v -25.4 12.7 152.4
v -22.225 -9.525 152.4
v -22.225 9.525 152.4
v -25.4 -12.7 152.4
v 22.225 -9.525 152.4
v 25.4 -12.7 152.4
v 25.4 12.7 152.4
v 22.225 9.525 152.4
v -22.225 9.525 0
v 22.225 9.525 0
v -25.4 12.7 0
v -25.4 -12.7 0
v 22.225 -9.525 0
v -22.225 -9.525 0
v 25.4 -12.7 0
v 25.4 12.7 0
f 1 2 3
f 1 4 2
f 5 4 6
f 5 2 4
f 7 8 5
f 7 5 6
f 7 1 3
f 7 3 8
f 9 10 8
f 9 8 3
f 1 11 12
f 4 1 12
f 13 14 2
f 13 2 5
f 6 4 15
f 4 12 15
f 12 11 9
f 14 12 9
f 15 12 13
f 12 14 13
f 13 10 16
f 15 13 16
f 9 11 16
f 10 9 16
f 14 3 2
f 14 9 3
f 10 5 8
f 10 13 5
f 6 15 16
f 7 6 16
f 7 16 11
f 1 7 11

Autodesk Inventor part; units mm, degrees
ref_plane "YZ Plane" through (0, 0, 0) normal (1, 0, 0) x (0, 1, 0)
ref_plane "Start Plane" through (0, 0, 0) normal (0, 0, 1) x (1, 0, 0)
ref_plane "End Plane" through (0, 0, 152.4) normal (0, 0, 1) x (1, 0, 0)
sketch "Sketch" plane through (0, 0, 0) normal (0, 0, 1) x (1, 0, 0)
  line L0 (-25.4, -12.7) -> (25.4, -12.7)
  line L1 (25.4, -12.7) -> (25.4, 12.7)
  line L2 (25.4, 12.7) -> (-25.4, 12.7)
  line L3 (-25.4, 12.7) -> (-25.4, -12.7)
  line L4 (-25.4, -12.7) -> (25.4, 12.7) construction
  line L5 (25.4, -12.7) -> (-25.4, 12.7) construction
  line L6 (-22.225, -9.525) -> (22.225, -9.525)
  line L7 (22.225, -9.525) -> (22.225, 9.525)
  line L8 (22.225, 9.525) -> (-22.225, 9.525)
  line L9 (-22.225, 9.525) -> (-22.225, -9.525)
  line L10 (-22.225, -9.525) -> (22.225, 9.525) construction
  line L11 (22.225, -9.525) -> (-22.225, 9.525) construction
  point P0 (0, 0)
  point P1 (0, 0)
  dimension "d0" = 50.8
  dimension "d1" = 25.4
  dimension "d2" = 3.175
  dimension "d3" = 3.175
extrude "Body" add sketch "Sketch" along normal up to surface (152.4 mm away) from surface at 0
sketch "Sketch4" plane through (0, 0, 0) normal (0, 0, 1) x (1, 0, 0)
  line L0 (0, 0) -> (10, 0)
ref_plane "Work Plane4" through (0, 0, 0) normal (0, -1, 0) x (1, 0, 0)
sketch "Sketch5" plane through (0, 0, 0) normal (0, -1, 0) x (1, 0, 0)
  line L0 (-2, 0) -> (12, 0)
  line L1 (-2, 152.4) -> (12, 152.4)
  dimension "d11" = 152.4
equation "\"G_OFFSET_START\" = 0"
equation "\"G_OFFSET_END\" = 0"
equation "\"d7\" = length + G_OFFSET_END"
equation "\"G_L\" = d11"
equation "\"length\" = 152.4"
properties part number "2x1inTubing"
